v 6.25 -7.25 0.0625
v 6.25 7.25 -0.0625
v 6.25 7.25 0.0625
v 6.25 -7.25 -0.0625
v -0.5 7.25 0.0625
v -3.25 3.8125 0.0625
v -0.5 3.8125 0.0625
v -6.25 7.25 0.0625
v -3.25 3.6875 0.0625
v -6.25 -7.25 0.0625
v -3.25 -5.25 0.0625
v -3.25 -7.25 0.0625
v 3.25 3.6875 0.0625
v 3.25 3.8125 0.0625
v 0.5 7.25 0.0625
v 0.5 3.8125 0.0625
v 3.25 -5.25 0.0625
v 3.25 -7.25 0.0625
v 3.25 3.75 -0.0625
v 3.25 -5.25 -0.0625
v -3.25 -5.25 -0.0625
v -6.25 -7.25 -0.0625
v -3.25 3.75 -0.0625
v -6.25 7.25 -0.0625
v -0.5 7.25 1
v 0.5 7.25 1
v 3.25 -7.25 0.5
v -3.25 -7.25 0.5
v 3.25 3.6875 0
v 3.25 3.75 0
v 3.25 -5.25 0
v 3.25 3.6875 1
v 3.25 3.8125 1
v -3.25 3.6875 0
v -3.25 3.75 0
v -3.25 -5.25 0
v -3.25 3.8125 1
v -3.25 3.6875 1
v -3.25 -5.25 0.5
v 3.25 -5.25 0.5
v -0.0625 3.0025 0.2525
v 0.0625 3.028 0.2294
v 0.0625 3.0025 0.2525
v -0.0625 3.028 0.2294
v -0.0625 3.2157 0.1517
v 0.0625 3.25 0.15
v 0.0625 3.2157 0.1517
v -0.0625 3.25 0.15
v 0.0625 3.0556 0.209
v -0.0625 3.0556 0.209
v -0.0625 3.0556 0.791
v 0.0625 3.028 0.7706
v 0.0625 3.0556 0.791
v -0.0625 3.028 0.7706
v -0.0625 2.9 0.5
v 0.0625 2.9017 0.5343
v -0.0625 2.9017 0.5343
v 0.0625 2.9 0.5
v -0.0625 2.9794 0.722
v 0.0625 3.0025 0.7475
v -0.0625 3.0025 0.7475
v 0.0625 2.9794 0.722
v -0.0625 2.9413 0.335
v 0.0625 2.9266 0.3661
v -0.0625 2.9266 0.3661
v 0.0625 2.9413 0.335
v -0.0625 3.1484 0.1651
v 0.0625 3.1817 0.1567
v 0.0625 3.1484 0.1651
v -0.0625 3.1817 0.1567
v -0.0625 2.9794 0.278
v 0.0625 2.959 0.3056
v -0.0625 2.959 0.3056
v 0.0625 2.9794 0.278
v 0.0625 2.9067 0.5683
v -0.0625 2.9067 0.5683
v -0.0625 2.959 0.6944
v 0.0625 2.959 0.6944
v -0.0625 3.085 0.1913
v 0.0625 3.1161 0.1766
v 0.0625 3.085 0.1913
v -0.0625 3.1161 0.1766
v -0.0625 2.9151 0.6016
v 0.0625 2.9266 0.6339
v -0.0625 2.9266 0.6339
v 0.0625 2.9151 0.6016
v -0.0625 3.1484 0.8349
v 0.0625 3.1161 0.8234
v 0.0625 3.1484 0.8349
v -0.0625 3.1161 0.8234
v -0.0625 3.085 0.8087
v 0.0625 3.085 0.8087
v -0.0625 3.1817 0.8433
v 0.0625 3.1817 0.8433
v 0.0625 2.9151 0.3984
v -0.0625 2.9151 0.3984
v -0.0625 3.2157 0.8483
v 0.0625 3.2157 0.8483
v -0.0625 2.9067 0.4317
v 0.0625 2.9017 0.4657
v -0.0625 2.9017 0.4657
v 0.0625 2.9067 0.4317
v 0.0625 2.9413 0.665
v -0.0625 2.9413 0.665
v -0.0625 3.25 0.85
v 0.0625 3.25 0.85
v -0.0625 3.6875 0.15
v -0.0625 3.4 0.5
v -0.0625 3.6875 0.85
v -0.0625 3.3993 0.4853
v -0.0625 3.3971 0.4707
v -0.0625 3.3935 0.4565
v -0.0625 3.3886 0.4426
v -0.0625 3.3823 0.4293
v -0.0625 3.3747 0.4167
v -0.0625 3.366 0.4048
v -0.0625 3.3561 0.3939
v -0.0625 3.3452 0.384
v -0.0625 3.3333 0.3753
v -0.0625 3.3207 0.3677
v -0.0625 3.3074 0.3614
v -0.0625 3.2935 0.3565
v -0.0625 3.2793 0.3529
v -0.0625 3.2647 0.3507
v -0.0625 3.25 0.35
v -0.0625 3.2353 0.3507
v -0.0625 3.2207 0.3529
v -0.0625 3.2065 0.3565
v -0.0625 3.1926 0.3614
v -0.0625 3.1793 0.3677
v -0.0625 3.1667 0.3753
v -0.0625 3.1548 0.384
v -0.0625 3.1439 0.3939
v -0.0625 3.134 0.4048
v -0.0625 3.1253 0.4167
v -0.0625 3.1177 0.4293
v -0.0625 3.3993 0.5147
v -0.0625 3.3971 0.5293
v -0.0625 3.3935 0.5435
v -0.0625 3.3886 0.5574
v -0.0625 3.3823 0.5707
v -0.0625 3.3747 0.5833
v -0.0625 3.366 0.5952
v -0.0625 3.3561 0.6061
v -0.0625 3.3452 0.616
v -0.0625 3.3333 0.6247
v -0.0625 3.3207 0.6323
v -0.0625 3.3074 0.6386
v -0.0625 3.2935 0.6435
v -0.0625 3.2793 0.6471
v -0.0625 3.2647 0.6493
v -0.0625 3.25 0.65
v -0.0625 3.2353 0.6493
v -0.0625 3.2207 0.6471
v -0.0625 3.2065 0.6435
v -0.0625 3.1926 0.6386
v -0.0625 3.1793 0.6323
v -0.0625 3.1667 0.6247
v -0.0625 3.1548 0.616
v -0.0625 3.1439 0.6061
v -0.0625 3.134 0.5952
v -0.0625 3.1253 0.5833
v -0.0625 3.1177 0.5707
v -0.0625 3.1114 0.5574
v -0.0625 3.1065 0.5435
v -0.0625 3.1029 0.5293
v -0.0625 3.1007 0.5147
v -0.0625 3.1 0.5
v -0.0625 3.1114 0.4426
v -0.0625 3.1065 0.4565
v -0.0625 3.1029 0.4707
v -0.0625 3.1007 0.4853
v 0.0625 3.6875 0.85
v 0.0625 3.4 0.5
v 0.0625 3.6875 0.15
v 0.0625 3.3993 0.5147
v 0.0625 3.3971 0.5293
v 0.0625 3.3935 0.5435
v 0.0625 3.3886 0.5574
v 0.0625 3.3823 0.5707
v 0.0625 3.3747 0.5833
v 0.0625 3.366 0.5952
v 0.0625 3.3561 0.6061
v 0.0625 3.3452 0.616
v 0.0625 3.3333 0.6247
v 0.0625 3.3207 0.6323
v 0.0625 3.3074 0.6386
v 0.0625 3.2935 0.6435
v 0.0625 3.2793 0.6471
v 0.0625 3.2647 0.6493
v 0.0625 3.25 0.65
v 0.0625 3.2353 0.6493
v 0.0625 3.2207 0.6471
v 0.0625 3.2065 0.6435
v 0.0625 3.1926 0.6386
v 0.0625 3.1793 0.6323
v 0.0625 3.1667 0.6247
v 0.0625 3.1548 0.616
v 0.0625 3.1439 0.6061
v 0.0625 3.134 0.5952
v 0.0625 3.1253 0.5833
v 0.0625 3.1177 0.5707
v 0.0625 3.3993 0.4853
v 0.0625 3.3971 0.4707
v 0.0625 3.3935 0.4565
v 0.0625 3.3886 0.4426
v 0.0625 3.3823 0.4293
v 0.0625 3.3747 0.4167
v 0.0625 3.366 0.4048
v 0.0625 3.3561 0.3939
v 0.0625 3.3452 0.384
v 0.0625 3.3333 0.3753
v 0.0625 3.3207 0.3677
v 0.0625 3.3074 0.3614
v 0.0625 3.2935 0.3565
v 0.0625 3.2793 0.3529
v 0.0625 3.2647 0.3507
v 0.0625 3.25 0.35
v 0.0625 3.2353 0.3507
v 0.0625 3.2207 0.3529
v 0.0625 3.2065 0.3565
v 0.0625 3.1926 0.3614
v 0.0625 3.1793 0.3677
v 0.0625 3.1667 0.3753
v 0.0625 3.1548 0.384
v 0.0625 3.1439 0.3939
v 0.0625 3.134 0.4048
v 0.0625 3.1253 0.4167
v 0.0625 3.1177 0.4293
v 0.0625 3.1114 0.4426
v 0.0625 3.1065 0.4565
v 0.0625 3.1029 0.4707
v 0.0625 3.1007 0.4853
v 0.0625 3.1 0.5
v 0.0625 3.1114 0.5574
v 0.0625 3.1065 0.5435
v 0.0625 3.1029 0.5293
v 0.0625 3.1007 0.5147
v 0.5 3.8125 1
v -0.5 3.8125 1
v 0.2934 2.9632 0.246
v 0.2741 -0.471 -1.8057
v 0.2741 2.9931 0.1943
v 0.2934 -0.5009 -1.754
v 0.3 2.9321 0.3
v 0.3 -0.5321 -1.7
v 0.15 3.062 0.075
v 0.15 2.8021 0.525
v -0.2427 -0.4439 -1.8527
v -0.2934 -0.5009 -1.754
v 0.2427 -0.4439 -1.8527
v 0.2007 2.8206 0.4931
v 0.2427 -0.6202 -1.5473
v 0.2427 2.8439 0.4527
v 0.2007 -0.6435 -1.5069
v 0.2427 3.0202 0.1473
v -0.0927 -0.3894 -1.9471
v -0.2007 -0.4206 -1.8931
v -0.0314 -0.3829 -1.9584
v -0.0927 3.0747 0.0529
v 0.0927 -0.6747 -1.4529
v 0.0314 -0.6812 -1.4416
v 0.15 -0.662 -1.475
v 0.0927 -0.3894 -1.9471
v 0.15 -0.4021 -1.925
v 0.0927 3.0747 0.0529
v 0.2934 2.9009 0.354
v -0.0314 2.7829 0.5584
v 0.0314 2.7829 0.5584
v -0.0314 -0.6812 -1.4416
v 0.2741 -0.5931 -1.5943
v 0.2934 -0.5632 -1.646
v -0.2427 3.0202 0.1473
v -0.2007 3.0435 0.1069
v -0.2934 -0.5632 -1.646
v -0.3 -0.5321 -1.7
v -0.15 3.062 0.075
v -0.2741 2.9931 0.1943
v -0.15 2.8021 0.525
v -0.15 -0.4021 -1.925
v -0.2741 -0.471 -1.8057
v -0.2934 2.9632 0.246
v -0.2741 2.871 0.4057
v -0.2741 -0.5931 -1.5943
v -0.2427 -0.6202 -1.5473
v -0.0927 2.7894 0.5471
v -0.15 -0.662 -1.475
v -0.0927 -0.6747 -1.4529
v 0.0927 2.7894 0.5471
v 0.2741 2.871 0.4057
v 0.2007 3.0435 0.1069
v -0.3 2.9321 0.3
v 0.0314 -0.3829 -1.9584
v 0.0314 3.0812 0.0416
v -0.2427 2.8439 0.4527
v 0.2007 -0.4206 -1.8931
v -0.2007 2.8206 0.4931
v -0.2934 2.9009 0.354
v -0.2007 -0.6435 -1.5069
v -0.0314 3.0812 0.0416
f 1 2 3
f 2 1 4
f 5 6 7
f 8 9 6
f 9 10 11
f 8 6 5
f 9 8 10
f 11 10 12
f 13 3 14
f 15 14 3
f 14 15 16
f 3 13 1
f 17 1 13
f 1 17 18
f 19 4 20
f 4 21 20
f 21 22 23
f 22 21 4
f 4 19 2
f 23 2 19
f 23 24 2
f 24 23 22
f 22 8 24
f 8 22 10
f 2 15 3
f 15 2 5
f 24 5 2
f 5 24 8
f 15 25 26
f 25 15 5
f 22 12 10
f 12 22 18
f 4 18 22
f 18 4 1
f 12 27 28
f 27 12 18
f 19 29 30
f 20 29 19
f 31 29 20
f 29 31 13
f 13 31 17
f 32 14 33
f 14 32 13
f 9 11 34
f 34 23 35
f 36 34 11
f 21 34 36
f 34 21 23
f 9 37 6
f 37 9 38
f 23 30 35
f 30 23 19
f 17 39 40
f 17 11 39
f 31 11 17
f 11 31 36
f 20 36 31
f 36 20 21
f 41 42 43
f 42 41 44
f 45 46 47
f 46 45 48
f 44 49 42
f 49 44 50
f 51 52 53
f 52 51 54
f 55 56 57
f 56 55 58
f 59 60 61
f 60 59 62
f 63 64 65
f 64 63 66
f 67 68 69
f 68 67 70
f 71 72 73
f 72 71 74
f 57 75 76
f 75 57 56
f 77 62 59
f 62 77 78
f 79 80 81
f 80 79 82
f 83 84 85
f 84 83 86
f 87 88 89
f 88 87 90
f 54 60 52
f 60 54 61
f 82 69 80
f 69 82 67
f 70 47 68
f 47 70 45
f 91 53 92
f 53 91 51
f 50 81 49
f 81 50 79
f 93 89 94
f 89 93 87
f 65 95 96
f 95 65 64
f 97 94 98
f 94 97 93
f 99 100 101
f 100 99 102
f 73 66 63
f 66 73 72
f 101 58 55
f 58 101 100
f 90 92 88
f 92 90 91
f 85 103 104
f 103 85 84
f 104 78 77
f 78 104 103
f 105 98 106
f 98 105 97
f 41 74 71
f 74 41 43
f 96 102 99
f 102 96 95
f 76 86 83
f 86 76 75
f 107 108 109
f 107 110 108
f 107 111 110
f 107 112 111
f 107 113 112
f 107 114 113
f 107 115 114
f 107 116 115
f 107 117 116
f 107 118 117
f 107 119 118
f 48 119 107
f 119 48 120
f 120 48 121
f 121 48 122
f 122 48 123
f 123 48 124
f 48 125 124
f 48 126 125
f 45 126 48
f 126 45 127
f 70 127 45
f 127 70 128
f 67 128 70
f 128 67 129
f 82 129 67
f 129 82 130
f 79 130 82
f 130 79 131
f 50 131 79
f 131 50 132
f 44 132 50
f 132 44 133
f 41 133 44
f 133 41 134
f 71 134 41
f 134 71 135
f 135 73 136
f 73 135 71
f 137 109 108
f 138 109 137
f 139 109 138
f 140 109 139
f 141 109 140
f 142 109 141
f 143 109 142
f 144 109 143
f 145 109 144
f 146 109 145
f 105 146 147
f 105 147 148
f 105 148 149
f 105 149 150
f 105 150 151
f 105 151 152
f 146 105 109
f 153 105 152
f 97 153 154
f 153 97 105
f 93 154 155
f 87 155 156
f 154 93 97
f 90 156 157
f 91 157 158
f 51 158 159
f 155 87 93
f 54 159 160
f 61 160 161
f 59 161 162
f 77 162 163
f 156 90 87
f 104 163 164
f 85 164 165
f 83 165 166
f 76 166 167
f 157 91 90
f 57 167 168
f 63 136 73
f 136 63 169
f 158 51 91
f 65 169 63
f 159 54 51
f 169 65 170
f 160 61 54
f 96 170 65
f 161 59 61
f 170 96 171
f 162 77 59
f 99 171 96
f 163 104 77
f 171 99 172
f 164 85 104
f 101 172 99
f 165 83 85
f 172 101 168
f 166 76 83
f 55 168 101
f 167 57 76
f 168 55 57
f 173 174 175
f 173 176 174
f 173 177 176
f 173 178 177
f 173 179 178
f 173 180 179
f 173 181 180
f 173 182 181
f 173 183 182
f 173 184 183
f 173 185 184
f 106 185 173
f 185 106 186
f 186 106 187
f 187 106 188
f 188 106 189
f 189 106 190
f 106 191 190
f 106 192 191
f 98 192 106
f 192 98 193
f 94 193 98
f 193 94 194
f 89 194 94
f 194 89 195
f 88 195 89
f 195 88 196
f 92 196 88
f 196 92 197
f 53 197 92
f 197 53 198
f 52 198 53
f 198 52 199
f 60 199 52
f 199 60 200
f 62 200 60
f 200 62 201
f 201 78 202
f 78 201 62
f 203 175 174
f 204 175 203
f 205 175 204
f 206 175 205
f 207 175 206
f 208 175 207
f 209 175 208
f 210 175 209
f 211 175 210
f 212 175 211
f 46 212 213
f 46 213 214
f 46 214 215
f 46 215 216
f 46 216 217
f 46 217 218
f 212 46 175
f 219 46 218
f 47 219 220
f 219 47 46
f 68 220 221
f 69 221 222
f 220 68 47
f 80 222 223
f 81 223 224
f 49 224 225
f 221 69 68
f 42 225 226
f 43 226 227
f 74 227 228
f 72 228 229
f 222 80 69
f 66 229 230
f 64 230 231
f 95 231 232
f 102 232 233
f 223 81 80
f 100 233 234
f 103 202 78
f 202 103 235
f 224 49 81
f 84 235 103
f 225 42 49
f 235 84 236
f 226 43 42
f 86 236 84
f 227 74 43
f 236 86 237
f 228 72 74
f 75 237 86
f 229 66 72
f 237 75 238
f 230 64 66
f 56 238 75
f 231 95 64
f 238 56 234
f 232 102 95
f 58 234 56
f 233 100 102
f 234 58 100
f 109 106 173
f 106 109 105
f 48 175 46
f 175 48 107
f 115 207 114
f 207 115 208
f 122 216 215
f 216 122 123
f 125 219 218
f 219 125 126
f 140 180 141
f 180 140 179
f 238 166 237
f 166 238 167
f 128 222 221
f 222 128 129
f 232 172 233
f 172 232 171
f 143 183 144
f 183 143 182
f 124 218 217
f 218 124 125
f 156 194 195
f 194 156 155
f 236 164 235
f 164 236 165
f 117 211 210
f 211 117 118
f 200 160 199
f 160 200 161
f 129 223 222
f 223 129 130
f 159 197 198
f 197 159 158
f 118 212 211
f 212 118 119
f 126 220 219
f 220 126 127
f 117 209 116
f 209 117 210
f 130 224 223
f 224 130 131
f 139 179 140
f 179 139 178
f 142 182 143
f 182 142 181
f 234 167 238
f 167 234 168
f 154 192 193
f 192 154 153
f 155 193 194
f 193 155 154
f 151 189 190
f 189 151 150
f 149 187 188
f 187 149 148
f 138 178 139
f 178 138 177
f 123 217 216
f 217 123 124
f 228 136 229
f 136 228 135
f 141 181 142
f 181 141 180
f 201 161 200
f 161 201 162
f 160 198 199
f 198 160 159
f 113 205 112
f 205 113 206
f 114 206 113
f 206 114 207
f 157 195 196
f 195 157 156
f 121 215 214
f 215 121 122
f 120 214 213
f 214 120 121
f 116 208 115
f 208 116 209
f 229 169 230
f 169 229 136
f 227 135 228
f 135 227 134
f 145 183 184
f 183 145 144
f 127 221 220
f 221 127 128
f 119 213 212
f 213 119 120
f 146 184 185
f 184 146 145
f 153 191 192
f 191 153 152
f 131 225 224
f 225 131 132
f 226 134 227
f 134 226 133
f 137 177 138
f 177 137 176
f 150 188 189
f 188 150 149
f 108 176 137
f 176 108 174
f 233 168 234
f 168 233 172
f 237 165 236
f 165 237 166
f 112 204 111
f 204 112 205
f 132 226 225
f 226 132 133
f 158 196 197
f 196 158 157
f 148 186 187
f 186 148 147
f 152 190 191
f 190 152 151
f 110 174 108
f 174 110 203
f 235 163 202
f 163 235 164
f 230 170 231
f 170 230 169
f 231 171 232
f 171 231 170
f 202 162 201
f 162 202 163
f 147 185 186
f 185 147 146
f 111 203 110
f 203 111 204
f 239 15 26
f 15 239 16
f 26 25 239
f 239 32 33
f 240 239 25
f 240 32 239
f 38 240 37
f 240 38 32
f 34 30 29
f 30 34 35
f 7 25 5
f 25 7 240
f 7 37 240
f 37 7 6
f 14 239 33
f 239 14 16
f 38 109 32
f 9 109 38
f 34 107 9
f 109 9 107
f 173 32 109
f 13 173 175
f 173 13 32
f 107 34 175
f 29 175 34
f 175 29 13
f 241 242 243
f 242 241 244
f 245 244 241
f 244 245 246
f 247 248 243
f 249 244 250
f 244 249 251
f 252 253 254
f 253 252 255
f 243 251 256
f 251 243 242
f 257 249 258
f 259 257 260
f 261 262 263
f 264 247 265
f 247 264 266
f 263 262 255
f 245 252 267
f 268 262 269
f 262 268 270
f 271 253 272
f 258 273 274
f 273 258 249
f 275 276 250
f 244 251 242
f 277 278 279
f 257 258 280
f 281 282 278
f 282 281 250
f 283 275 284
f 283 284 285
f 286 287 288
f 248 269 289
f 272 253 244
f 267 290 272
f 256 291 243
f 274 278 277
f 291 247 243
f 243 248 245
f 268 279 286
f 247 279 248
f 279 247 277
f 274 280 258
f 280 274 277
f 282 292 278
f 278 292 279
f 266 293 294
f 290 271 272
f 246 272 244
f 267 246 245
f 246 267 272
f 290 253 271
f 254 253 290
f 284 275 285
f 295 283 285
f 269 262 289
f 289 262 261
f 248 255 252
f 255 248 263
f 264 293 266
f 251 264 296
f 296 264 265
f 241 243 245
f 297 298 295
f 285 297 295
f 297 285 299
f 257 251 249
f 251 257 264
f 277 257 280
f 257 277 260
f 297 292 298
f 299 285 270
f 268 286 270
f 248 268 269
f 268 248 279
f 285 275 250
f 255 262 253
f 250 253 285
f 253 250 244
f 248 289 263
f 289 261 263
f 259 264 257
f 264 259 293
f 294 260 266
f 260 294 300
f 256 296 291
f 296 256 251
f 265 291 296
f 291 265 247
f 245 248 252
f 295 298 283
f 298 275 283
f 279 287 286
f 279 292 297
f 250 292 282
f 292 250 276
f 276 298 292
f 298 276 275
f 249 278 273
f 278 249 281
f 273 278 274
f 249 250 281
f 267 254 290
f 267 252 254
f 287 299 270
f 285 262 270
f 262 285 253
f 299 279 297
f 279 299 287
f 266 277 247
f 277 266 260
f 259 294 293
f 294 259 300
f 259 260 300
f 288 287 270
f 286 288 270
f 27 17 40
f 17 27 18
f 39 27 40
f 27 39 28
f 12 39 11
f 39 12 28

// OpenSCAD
module SuspensionBox() {
  w = 12.5; // width
  d = 14.5; // depth

  iw = 6.5; // inner width
  id = 9; // inner depth

  // base plate
  difference() {
    cube(size=[w, d, 0.125], center=true);
    translate([0, -0.75, 0]) {
      cube(size=[iw, id, 2], center=true);
    }
  }

  // box beam support
  translate([0, 5.5, 0.5]) {
    cube(size=[1, 3.5, 1], center=true);
  }

  // flange
  translate([0, 3.75, 0.5]) {
    cube(size=[iw, 0.125, 1], center=true);
  }

  // eye hook
  translate([0, 3.25, 0.5]) {
    difference() {
      union() {
        rotate([0, 90, 0]) {
          cylinder(r=0.35, h=0.125, $fn=64, center=true);
        }
        translate([0, 1, 0]) {
          cube(size=[0.125, 2, 0.7], center=true);
        }
      }
      rotate([0, 90, 0]) {
        cylinder(r=0.15, h=2, $fn=64, center=true);
      }
    }
  }

  // Dampener
  translate([0, 1.2, -0.7]) {
    rotate([-60, 0, 0]) {
      cylinder(r=0.3, h=4, center=true, $fn=30);
    }
  }

  // rear support thing
  translate([0, -6.25, 0.25]) {
    cube(size=[iw, 2, 0.5], center=true);
  }
}

SuspensionBox();
